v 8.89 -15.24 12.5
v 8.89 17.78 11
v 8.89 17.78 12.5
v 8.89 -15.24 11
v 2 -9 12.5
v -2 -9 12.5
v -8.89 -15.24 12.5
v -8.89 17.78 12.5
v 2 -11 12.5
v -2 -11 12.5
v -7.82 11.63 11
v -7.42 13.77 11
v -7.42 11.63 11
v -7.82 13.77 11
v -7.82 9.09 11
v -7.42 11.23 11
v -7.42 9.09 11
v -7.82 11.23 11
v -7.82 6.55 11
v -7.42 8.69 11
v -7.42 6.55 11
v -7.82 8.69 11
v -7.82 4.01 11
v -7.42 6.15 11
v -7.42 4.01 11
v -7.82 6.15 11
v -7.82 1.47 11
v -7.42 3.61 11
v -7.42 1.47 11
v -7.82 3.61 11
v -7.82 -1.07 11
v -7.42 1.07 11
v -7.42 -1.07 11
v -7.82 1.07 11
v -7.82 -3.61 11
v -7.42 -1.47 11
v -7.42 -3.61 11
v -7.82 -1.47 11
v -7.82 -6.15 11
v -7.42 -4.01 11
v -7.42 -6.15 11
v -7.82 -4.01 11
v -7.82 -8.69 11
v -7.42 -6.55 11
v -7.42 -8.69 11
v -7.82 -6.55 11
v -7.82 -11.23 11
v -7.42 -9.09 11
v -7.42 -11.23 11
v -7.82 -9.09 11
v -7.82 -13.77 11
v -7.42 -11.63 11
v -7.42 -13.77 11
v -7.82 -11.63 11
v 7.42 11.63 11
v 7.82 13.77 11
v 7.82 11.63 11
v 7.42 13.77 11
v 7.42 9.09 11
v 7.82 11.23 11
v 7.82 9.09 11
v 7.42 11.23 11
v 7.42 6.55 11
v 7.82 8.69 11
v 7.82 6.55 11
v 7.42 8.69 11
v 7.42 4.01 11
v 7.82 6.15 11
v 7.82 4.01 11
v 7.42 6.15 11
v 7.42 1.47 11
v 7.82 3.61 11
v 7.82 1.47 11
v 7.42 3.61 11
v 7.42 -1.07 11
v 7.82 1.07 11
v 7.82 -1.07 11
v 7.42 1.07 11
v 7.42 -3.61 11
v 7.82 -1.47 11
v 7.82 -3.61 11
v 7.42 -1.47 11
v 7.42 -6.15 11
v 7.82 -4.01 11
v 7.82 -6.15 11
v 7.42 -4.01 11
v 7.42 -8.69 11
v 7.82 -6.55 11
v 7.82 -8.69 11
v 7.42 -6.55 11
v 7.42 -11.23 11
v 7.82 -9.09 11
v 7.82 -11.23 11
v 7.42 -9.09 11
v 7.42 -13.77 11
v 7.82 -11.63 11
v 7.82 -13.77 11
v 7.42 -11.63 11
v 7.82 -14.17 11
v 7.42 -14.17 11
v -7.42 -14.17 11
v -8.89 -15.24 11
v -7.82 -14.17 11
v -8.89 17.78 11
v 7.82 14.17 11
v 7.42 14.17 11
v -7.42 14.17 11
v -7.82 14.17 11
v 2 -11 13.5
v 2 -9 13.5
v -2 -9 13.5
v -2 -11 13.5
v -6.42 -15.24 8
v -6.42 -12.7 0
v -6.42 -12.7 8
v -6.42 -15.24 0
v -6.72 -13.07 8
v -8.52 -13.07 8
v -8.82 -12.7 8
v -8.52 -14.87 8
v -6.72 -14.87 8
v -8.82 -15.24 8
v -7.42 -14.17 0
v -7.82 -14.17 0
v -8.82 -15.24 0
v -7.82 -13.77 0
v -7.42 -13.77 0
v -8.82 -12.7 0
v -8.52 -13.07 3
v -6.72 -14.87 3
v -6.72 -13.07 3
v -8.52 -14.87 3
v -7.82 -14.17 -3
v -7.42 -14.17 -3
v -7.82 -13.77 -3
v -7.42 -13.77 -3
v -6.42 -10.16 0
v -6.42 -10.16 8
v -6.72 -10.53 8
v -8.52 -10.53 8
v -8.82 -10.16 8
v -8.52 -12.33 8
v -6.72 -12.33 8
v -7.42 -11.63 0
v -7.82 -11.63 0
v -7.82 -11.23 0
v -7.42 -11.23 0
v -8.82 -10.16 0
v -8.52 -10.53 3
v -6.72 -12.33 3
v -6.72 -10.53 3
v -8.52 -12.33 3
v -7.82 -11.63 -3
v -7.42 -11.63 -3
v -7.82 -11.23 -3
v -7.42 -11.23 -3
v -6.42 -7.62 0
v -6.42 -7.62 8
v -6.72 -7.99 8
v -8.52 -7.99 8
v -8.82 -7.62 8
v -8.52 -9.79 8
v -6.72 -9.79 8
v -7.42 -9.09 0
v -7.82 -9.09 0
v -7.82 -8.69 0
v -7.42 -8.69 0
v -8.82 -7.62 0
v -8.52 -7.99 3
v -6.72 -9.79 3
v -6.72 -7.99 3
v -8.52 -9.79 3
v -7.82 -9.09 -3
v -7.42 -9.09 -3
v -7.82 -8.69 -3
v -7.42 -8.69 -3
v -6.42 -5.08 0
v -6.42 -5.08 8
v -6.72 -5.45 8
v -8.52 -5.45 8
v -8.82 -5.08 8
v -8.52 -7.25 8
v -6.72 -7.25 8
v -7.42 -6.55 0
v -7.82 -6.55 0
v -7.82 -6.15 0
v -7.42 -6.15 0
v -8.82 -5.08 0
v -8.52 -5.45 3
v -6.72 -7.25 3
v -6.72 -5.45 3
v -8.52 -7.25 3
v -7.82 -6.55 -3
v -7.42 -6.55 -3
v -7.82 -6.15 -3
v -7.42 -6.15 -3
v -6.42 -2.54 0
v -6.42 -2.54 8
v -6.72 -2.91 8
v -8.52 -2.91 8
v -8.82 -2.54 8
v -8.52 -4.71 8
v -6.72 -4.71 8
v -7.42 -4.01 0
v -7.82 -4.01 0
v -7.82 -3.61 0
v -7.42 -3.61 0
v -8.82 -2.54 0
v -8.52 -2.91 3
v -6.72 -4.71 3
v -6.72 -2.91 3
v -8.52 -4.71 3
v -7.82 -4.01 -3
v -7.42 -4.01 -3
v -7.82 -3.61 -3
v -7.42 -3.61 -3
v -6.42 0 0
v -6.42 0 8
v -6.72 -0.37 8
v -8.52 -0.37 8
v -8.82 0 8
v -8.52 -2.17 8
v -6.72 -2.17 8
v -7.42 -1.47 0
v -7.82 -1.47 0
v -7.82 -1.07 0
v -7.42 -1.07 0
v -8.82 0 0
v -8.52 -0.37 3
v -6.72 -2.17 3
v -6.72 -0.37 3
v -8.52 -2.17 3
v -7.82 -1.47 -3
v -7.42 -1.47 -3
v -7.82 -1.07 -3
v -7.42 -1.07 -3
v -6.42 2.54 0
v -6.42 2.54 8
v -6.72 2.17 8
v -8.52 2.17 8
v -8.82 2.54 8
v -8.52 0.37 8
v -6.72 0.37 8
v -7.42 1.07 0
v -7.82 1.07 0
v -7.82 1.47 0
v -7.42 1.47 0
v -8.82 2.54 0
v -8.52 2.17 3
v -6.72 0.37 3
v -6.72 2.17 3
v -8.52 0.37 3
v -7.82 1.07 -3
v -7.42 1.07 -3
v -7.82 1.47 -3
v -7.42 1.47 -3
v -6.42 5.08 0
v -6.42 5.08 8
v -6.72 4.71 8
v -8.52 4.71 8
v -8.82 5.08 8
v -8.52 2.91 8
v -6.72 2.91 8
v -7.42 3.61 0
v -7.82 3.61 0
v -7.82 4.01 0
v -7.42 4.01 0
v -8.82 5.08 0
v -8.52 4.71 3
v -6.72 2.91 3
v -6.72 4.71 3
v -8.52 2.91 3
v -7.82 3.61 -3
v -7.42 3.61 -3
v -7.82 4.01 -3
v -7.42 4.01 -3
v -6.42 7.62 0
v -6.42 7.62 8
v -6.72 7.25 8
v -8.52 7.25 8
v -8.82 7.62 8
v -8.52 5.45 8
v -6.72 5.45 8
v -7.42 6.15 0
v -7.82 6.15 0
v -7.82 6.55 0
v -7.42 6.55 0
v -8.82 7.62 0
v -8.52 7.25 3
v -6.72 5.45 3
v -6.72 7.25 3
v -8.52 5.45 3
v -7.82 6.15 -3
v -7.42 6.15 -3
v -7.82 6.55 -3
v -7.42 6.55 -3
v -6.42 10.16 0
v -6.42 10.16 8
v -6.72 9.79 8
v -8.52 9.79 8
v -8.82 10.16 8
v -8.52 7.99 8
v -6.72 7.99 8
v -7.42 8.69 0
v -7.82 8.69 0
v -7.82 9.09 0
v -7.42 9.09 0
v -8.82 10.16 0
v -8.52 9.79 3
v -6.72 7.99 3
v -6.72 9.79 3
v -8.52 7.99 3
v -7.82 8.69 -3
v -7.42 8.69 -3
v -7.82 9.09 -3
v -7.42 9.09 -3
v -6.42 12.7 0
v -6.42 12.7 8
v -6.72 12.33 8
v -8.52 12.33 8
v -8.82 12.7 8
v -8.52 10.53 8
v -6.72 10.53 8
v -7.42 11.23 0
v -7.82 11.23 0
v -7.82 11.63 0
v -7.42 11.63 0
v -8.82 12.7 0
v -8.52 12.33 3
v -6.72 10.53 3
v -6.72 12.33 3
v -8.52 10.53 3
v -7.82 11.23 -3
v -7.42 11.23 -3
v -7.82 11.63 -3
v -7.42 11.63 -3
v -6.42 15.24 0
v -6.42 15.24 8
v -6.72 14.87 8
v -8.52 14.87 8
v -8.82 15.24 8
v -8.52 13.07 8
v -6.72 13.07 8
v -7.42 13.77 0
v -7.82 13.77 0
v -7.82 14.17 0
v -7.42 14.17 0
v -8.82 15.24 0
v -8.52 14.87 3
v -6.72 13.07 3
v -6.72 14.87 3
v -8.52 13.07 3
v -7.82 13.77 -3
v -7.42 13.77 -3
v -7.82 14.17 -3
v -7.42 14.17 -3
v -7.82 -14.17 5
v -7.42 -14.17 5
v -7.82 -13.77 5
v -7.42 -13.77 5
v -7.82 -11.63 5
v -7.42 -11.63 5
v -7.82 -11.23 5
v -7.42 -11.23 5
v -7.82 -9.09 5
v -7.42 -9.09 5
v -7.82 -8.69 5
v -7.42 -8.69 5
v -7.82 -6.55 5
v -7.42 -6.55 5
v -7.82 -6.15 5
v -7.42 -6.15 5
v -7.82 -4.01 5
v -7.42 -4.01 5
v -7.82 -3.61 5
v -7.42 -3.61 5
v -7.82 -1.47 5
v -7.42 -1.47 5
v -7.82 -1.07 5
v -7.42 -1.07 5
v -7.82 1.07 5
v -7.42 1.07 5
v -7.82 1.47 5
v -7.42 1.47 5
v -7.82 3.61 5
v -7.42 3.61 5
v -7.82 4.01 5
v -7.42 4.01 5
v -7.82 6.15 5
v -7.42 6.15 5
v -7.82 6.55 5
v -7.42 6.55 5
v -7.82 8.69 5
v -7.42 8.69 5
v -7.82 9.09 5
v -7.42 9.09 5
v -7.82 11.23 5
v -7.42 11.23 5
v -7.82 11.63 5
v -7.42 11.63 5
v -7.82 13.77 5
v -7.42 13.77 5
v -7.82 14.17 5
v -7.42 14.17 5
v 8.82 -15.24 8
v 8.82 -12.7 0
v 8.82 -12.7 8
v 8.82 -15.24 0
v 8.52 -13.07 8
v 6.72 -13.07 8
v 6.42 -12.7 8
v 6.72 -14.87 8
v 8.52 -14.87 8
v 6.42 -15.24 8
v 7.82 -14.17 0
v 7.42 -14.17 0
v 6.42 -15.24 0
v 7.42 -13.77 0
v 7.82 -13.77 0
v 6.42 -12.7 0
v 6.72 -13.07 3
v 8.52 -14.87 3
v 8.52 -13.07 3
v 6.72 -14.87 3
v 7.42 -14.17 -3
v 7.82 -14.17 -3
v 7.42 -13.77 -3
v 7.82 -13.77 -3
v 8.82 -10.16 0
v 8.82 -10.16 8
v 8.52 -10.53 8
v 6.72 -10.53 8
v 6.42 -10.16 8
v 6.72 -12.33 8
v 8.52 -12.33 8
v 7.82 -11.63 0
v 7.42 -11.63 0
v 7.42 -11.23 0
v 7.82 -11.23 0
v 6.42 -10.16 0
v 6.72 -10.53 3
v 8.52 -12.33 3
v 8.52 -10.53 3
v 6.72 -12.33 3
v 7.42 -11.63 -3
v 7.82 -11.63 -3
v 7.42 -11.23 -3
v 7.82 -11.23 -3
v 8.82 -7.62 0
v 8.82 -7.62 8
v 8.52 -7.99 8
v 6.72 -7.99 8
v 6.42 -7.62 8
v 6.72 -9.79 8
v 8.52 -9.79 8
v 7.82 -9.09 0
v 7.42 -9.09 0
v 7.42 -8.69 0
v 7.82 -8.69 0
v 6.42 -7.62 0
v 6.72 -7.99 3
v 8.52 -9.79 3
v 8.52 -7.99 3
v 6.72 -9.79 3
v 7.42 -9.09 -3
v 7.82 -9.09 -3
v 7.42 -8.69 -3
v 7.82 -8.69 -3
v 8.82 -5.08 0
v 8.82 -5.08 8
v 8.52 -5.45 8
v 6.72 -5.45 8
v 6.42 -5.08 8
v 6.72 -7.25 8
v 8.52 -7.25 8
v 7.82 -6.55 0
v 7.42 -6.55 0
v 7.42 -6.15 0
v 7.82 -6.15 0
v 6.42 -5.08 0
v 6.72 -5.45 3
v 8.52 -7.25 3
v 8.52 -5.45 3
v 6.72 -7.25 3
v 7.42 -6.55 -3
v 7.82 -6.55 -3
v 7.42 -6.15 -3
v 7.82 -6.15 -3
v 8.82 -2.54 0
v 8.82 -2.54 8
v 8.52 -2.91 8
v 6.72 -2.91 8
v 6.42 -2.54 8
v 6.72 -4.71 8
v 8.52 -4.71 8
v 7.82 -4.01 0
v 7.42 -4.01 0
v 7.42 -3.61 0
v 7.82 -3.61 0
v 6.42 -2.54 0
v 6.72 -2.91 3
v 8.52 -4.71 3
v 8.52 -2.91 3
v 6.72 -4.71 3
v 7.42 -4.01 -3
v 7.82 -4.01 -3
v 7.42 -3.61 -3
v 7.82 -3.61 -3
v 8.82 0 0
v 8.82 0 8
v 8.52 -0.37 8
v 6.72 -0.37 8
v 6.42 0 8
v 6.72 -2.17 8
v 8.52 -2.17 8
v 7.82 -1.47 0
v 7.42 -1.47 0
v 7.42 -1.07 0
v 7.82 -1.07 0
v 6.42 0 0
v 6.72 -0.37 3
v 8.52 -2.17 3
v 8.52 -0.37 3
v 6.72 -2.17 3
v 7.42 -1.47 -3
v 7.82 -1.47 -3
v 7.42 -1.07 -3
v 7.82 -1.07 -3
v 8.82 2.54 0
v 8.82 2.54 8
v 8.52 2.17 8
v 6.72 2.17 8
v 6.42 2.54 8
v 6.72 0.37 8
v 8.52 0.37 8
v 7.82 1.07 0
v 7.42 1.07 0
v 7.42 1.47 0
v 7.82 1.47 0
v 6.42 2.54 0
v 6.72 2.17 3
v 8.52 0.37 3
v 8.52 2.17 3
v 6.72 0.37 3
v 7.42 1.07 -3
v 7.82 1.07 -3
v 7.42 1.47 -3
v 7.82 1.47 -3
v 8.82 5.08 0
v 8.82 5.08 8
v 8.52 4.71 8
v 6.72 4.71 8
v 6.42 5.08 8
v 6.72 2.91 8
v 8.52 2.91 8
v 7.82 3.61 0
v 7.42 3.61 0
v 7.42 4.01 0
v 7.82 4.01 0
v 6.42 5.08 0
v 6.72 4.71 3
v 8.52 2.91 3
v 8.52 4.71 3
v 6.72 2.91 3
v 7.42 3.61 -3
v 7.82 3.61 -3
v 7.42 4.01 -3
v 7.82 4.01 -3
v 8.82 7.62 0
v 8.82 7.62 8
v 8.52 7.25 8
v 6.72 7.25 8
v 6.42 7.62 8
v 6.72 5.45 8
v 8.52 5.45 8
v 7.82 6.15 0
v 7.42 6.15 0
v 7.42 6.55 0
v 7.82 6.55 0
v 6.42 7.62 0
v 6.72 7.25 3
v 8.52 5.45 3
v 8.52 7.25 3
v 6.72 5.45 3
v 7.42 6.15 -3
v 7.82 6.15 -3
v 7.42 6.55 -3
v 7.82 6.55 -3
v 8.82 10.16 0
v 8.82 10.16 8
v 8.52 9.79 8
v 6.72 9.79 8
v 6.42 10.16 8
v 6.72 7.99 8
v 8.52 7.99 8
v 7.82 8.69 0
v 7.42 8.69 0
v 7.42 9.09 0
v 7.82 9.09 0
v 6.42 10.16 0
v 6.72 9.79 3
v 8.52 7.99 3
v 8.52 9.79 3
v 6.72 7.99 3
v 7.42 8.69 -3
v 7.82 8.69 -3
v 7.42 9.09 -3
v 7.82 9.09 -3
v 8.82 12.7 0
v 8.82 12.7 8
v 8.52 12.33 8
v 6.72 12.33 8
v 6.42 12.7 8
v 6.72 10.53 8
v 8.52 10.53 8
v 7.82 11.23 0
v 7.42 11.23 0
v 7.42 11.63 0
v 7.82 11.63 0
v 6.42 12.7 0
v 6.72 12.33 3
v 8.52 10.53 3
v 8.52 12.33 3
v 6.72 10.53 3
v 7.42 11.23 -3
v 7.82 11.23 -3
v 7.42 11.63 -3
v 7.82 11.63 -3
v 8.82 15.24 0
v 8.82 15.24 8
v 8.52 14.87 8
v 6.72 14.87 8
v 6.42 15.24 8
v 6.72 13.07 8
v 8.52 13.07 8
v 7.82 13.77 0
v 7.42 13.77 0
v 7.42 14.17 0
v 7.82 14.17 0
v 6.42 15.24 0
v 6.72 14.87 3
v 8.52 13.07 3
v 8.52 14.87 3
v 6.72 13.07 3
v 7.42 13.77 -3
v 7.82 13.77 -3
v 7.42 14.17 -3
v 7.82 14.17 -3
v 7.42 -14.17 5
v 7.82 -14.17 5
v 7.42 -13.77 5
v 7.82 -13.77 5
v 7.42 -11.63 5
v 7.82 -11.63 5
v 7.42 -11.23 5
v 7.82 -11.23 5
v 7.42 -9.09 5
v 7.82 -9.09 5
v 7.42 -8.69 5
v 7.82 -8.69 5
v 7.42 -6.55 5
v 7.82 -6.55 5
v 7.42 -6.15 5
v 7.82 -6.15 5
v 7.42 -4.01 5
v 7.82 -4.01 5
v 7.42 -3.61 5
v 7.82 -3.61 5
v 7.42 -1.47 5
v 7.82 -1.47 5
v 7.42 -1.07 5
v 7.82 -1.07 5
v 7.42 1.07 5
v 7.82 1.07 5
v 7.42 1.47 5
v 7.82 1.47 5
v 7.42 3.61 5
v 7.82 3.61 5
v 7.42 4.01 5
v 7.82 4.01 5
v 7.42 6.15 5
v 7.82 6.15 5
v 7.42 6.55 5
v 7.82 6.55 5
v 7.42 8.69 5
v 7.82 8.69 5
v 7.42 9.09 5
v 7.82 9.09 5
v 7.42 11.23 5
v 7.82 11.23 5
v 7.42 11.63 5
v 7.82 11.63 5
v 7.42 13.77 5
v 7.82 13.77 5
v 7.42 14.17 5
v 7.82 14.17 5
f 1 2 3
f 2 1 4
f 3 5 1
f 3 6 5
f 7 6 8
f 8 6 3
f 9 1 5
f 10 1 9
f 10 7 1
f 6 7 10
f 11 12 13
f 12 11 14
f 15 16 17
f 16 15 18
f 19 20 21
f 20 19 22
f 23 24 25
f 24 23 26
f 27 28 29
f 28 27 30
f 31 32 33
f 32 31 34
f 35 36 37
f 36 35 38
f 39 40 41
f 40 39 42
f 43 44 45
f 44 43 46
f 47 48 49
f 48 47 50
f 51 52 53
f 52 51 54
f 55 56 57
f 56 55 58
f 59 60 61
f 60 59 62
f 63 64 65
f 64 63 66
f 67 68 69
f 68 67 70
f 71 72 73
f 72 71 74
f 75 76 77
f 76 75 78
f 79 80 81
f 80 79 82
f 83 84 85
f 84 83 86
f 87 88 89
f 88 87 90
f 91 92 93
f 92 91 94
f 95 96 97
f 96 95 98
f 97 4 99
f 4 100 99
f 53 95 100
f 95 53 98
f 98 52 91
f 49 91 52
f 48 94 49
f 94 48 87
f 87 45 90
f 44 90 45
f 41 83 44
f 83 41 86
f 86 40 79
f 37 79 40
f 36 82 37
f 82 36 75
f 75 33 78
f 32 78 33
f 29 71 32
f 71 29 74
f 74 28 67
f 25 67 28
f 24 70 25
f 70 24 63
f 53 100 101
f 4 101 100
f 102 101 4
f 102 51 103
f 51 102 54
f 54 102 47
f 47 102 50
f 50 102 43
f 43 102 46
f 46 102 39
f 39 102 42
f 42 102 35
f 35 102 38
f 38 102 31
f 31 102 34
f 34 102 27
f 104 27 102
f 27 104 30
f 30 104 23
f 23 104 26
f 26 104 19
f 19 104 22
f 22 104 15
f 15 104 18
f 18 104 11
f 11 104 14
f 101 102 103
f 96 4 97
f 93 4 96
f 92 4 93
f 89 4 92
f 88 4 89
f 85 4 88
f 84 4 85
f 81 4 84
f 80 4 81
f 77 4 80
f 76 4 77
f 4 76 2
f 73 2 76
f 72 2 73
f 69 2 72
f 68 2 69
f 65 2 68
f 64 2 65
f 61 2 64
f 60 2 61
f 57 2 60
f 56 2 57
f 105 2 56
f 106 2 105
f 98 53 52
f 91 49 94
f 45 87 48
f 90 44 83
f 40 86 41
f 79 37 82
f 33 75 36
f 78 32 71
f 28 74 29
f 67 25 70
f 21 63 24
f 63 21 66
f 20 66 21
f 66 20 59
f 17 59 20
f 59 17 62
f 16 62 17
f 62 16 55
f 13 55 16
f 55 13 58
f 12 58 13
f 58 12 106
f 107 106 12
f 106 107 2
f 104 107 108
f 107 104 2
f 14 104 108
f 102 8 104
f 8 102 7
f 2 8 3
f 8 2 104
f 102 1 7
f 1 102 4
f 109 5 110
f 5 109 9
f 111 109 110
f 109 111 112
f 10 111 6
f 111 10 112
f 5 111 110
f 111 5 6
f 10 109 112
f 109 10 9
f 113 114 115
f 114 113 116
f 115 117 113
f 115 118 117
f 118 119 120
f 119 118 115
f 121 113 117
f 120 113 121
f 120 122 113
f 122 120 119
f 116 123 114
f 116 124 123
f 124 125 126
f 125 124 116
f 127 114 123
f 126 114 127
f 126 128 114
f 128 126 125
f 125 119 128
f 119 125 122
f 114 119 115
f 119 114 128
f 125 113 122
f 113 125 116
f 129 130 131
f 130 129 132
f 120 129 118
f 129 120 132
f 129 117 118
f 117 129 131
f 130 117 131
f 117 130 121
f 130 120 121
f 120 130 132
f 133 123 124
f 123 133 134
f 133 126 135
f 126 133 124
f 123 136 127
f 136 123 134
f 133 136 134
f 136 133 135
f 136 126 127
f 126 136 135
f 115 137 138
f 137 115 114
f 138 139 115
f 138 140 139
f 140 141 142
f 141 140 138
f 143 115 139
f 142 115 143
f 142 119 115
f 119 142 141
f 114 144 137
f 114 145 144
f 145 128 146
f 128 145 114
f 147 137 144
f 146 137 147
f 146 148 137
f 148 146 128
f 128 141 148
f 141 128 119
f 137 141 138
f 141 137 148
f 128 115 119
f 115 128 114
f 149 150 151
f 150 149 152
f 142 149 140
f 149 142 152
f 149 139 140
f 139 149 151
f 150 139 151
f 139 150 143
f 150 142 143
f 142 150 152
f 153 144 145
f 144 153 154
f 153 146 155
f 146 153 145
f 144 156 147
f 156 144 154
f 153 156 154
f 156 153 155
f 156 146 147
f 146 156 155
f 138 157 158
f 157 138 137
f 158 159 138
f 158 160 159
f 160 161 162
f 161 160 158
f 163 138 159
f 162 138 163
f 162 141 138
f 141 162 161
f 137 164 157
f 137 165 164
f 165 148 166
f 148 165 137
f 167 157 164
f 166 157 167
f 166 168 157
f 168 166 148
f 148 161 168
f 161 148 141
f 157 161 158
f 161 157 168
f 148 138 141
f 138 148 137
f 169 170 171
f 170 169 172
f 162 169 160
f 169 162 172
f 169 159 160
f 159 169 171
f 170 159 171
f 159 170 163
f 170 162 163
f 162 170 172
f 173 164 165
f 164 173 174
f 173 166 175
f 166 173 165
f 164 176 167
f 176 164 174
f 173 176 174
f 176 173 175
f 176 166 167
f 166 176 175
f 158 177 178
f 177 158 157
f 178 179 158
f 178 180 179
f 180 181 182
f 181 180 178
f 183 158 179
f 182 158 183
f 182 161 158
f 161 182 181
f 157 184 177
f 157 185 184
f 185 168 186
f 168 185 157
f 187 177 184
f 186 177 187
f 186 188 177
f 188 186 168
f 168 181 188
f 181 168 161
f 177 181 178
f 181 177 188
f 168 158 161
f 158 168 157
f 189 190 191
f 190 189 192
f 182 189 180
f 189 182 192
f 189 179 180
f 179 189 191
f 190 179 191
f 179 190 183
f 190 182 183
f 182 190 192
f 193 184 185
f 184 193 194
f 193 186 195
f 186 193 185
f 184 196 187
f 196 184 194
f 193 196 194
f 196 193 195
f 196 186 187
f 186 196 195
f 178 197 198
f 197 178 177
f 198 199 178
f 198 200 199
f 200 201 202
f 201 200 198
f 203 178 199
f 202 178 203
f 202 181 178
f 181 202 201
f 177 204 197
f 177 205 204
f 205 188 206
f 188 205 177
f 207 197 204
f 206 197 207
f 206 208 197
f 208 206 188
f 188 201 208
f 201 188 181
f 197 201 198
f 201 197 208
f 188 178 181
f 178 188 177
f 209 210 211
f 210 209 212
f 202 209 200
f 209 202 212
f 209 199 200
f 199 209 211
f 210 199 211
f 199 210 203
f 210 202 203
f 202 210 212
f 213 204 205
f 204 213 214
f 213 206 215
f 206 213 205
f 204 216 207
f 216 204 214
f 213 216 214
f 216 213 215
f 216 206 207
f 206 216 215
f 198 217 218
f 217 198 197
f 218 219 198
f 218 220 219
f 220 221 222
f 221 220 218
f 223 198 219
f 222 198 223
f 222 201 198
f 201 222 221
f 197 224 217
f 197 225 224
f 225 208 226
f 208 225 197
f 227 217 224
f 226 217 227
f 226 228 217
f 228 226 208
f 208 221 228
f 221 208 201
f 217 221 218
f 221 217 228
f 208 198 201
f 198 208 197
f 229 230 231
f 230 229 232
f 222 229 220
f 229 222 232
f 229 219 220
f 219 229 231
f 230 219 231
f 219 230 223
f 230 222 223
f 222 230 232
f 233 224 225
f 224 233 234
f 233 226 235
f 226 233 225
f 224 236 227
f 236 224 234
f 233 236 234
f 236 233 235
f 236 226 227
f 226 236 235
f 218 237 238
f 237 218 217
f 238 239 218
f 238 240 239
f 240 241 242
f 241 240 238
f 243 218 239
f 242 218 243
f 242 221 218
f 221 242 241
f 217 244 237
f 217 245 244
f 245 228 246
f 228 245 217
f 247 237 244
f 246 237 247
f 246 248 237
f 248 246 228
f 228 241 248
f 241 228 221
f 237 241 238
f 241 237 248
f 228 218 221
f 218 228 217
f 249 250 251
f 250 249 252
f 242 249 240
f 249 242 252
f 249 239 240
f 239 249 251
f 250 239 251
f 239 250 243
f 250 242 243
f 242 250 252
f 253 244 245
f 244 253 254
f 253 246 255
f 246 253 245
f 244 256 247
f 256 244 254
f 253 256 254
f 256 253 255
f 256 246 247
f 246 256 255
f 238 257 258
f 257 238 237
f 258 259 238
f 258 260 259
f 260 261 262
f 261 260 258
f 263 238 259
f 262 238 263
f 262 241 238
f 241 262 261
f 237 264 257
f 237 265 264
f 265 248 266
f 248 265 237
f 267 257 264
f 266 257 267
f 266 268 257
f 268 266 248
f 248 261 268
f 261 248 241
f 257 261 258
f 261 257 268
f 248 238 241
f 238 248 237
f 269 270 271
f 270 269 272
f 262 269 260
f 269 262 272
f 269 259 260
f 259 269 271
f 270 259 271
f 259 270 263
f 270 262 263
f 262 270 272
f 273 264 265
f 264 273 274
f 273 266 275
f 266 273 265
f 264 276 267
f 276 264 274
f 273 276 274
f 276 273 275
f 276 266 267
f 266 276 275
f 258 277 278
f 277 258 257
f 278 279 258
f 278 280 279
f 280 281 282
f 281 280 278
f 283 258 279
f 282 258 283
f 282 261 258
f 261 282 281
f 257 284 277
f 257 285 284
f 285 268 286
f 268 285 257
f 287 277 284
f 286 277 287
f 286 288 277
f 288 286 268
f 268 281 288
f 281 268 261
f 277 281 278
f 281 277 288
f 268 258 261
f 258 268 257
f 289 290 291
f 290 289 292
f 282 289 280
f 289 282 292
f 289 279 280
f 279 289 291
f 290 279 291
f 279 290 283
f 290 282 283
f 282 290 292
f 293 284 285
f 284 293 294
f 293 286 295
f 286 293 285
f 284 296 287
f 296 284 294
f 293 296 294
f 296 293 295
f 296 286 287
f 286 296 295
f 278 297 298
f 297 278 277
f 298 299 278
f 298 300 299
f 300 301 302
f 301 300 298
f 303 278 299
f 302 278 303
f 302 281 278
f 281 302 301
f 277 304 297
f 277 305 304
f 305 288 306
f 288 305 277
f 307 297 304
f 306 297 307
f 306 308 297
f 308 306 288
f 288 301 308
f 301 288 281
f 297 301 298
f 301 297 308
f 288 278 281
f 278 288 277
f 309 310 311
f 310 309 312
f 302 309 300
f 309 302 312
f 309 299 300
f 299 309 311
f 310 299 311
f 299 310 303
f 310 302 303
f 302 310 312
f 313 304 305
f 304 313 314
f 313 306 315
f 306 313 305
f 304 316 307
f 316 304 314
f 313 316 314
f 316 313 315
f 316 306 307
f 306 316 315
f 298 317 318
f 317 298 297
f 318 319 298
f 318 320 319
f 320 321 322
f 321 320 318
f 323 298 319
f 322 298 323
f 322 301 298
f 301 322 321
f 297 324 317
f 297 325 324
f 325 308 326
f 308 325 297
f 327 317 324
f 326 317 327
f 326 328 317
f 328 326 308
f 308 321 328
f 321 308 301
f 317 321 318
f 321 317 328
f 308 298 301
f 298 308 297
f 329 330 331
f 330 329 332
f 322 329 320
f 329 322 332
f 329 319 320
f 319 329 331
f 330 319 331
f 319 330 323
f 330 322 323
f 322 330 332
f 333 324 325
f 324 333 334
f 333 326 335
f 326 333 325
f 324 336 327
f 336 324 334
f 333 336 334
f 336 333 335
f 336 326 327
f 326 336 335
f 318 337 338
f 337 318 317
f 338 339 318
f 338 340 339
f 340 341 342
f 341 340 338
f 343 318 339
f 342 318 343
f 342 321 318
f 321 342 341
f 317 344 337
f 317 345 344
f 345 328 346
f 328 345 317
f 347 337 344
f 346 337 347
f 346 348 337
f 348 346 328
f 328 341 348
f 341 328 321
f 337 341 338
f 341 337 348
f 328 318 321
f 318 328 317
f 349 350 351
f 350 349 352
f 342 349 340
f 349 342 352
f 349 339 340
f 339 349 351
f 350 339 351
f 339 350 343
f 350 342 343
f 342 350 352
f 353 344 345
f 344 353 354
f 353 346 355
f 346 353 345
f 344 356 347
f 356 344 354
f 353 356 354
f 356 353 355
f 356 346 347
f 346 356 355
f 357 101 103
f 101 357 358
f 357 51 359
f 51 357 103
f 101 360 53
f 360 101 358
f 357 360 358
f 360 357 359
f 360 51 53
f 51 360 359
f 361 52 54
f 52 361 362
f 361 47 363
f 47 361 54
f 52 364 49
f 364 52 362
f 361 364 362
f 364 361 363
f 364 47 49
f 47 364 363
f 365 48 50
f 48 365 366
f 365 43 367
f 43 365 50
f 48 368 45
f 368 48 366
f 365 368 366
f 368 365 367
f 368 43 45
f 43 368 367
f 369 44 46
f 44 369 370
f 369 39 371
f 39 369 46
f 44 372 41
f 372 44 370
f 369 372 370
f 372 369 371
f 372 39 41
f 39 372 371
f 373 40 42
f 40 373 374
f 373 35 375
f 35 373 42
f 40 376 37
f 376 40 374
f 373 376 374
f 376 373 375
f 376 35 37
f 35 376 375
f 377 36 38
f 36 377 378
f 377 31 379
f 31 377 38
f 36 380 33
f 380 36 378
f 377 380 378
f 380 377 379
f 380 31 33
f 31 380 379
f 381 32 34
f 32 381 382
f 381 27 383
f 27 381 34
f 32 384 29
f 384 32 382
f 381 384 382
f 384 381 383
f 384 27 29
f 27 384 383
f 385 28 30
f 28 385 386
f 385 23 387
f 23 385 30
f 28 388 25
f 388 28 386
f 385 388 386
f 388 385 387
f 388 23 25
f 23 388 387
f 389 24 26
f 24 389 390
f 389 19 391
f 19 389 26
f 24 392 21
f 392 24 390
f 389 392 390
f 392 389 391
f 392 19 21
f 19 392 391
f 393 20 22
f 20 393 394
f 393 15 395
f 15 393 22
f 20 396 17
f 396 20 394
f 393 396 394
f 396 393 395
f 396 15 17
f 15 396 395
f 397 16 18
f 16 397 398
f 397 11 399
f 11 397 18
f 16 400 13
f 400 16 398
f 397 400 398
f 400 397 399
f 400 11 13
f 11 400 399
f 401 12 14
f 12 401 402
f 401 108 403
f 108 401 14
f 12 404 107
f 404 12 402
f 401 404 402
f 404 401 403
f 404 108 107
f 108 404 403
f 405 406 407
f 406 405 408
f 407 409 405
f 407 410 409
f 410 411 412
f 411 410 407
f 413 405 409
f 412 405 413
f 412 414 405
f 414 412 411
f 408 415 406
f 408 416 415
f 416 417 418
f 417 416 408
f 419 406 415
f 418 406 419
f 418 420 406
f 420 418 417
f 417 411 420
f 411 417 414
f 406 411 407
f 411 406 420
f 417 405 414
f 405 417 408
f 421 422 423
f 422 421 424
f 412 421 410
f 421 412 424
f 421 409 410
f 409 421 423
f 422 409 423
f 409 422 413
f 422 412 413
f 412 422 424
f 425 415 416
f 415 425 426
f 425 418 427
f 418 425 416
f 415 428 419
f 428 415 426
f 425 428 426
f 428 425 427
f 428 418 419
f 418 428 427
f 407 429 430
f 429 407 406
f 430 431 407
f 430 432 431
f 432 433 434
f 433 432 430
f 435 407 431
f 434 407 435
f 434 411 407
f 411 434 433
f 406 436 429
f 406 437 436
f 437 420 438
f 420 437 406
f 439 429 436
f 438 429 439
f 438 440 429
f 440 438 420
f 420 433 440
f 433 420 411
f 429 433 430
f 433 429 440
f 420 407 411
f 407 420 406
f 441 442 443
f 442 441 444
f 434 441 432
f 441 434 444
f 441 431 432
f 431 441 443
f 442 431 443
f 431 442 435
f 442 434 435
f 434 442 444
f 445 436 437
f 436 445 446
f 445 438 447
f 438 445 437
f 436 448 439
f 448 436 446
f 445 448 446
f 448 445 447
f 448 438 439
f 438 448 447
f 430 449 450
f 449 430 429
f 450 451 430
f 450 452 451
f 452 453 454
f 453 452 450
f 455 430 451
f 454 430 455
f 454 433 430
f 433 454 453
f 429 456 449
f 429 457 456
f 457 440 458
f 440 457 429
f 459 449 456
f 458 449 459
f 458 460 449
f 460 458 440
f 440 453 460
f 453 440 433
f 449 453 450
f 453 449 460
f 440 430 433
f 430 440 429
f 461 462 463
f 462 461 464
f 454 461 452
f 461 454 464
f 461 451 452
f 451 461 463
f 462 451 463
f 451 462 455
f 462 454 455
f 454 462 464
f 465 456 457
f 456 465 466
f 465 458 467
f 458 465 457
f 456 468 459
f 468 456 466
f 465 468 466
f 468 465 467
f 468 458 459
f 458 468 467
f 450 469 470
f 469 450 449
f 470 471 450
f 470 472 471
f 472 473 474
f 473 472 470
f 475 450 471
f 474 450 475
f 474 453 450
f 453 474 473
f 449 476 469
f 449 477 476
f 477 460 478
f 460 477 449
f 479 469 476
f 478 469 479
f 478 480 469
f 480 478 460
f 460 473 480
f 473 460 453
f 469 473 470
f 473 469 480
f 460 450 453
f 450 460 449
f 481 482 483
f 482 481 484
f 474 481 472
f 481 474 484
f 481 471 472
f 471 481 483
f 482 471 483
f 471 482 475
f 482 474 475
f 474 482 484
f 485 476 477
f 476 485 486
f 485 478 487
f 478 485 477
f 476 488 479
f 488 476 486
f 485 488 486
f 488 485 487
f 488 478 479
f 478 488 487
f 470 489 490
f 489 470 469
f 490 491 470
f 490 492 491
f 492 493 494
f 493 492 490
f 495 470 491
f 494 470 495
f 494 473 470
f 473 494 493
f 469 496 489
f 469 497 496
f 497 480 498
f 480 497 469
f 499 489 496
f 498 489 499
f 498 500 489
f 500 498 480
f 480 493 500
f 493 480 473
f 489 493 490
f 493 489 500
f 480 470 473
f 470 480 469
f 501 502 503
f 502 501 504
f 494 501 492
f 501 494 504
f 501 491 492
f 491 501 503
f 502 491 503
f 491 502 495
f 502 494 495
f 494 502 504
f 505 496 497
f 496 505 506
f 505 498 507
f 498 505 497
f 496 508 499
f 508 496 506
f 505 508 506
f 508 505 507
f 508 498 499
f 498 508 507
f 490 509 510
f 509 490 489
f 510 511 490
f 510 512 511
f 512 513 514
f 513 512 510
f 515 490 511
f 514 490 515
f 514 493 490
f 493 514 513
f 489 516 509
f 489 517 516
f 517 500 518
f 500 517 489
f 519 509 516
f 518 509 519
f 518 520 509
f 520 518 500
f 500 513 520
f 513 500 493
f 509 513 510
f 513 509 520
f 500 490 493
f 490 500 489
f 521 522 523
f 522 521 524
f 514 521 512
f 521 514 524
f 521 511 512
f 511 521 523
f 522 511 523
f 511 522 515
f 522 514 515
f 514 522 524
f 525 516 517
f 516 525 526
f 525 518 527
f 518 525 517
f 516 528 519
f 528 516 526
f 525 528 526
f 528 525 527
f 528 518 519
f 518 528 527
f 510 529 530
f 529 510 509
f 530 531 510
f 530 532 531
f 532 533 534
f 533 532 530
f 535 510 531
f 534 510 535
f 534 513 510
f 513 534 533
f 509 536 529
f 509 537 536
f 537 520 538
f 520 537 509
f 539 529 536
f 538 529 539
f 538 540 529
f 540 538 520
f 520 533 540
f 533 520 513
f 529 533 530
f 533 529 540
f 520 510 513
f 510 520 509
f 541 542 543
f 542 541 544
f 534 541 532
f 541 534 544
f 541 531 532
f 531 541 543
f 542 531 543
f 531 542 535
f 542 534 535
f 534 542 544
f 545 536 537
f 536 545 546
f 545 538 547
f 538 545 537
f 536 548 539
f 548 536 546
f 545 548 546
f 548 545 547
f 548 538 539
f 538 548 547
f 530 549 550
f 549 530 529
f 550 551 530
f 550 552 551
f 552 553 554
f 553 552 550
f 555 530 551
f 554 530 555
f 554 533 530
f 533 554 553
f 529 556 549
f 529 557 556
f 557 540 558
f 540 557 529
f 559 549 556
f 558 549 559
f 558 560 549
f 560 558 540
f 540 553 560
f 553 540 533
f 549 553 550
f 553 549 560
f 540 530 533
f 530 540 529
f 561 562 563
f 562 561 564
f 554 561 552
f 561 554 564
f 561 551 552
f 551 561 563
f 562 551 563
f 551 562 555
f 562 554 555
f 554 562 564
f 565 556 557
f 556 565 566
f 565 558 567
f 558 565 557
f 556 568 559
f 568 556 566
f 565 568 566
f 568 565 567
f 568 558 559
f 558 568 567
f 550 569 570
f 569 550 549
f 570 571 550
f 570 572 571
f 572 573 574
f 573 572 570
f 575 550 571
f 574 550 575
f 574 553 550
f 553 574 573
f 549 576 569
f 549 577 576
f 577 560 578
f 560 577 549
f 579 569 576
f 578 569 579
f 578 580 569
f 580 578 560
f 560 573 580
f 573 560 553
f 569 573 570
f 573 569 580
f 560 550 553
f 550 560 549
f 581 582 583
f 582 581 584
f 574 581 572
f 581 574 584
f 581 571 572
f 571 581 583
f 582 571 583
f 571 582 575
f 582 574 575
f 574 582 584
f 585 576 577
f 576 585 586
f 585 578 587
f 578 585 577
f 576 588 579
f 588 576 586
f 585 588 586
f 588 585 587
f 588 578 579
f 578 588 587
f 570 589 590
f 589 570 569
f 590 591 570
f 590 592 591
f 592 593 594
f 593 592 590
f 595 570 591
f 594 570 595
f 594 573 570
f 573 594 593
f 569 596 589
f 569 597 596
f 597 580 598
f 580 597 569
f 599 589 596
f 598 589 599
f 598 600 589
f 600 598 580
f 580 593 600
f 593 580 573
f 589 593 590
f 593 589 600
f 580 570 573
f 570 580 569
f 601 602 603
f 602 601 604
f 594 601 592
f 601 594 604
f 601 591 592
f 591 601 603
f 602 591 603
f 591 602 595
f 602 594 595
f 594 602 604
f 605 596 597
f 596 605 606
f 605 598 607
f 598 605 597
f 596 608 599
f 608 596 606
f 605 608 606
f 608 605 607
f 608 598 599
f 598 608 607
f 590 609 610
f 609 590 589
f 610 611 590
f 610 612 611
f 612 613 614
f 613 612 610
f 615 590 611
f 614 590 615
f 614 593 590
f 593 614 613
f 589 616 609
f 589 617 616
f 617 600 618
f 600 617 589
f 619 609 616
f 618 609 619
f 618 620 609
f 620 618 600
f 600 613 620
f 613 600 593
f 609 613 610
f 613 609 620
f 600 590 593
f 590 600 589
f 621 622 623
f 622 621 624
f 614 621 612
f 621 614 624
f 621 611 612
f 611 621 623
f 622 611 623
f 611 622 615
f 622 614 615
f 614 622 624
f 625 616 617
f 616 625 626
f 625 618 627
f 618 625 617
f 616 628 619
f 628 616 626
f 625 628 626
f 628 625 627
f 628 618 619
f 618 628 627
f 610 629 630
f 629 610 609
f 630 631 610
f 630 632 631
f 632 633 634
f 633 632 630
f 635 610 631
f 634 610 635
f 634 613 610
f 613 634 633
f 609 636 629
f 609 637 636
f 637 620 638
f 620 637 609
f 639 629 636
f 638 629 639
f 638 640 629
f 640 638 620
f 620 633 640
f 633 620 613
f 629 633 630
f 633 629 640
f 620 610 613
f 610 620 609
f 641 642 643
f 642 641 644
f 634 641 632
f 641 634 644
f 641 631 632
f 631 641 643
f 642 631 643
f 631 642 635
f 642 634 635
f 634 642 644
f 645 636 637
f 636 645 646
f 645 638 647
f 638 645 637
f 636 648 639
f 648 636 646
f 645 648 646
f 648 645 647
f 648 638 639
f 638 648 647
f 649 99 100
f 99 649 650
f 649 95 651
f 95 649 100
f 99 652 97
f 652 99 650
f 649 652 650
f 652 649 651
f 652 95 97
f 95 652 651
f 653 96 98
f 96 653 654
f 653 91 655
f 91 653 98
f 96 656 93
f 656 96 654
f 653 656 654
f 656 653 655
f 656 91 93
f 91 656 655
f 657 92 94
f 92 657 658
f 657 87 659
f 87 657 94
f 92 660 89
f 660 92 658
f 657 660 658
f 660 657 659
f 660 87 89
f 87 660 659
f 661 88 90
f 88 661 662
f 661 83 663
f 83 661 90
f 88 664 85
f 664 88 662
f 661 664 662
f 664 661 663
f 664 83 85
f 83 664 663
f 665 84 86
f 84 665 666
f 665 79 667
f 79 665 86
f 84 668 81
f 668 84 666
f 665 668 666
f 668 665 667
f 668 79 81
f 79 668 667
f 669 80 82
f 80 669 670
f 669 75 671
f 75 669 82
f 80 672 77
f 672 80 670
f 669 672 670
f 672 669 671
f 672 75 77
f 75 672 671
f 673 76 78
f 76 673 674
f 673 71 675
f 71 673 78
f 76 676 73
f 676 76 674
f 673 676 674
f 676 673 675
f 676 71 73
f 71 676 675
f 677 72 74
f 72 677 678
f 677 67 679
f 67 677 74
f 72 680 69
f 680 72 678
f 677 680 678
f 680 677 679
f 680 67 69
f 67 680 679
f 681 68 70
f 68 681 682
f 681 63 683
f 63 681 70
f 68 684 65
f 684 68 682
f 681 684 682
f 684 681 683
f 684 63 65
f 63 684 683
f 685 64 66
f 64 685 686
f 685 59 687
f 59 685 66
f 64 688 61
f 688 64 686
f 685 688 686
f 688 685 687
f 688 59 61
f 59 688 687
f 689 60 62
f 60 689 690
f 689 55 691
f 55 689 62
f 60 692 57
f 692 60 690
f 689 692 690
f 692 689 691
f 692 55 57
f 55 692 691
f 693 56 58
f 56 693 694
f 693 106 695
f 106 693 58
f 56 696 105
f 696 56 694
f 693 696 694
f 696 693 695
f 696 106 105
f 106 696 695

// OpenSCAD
// file: FH_CONNECTOR.scad
$fa = 1;
$fs = 0.04;

pin_count = 6;

step = 2.54;

body_color = [0.1,0.1,0.1];

body_width = 2.4;
body_height = 8;

hole_color = [0.4,0.4,0.4];
hole_width = 1.8;
hole_depth = 5;

pin_color = [0.9,0.9,0.9];
pin_height = 3;
pin_width = 0.4;

// centered pin
module pin() {
    difference() {
        color(body_color)
            translate([-body_width/2,-step/2,0])
                cube([body_width,step,body_height]);
        color(hole_color)
            translate([-hole_width/2,-hole_width/2,body_height-hole_depth])
                linear_extrude(height = hole_depth+0.1)
                    square(hole_width);
    }
    color(pin_color)
        rotate([180,0,0])
        linear_extrude(height = pin_height)
            square(pin_width,center=true);

}

module raw(pin_count) {
    for(i=[0:1:pin_count-1]) {
        translate([0,step * (i - (pin_count-1)/2),0])
        pin();
    }
}

raw(pin_count);
// main file
use <FH_CONNECTOR.scad>

$fa = 1;
$fs = 0.04;

step = 2.54;

inter_raw_distance = 6*step;

raw_pin_count = 12;

board_color = [0.1,0.2,0.6];
board_width = 7*step;
board_length = 13*step;
board_depth = 1.5;
board_offset_y = -raw_pin_count*step/2;
board_offset_z = 11;

button_color = [0.6,0.2,0.2];
button_width = 4;
button_length = 2;
button_depth = 1;
button_offset_y = -10;

pin_color = [0.9,0.9,0.9];
pin_height = 6;
pin_width = 0.4;

module pin() {
    color(pin_color)
        rotate([180,0,0])
        linear_extrude(height = pin_height)
            square(pin_width,center=true);

}

module raw_pins(pin_count) {
    for(i=[0:1:pin_count-1]) {
        translate([0,step * (i - (pin_count-1)/2),0])
        pin();
    }
}

module board() {
    color(board_color)
        translate([-board_width/2,board_offset_y,board_offset_z])            
            cube([board_width,board_length,board_depth]);
    color(button_color)
        translate([-button_width/2,button_offset_y-button_length/2,board_offset_z+board_depth])            
            cube([button_width,button_length,button_depth]);
}

board();

translate([-inter_raw_distance/2,0,0])
    raw(raw_pin_count);

translate([-inter_raw_distance/2,0,board_offset_z])
    raw_pins(raw_pin_count);
    
translate([inter_raw_distance/2,0,0])
    raw(raw_pin_count);

translate([inter_raw_distance/2,0,board_offset_z])
    raw_pins(raw_pin_count);
